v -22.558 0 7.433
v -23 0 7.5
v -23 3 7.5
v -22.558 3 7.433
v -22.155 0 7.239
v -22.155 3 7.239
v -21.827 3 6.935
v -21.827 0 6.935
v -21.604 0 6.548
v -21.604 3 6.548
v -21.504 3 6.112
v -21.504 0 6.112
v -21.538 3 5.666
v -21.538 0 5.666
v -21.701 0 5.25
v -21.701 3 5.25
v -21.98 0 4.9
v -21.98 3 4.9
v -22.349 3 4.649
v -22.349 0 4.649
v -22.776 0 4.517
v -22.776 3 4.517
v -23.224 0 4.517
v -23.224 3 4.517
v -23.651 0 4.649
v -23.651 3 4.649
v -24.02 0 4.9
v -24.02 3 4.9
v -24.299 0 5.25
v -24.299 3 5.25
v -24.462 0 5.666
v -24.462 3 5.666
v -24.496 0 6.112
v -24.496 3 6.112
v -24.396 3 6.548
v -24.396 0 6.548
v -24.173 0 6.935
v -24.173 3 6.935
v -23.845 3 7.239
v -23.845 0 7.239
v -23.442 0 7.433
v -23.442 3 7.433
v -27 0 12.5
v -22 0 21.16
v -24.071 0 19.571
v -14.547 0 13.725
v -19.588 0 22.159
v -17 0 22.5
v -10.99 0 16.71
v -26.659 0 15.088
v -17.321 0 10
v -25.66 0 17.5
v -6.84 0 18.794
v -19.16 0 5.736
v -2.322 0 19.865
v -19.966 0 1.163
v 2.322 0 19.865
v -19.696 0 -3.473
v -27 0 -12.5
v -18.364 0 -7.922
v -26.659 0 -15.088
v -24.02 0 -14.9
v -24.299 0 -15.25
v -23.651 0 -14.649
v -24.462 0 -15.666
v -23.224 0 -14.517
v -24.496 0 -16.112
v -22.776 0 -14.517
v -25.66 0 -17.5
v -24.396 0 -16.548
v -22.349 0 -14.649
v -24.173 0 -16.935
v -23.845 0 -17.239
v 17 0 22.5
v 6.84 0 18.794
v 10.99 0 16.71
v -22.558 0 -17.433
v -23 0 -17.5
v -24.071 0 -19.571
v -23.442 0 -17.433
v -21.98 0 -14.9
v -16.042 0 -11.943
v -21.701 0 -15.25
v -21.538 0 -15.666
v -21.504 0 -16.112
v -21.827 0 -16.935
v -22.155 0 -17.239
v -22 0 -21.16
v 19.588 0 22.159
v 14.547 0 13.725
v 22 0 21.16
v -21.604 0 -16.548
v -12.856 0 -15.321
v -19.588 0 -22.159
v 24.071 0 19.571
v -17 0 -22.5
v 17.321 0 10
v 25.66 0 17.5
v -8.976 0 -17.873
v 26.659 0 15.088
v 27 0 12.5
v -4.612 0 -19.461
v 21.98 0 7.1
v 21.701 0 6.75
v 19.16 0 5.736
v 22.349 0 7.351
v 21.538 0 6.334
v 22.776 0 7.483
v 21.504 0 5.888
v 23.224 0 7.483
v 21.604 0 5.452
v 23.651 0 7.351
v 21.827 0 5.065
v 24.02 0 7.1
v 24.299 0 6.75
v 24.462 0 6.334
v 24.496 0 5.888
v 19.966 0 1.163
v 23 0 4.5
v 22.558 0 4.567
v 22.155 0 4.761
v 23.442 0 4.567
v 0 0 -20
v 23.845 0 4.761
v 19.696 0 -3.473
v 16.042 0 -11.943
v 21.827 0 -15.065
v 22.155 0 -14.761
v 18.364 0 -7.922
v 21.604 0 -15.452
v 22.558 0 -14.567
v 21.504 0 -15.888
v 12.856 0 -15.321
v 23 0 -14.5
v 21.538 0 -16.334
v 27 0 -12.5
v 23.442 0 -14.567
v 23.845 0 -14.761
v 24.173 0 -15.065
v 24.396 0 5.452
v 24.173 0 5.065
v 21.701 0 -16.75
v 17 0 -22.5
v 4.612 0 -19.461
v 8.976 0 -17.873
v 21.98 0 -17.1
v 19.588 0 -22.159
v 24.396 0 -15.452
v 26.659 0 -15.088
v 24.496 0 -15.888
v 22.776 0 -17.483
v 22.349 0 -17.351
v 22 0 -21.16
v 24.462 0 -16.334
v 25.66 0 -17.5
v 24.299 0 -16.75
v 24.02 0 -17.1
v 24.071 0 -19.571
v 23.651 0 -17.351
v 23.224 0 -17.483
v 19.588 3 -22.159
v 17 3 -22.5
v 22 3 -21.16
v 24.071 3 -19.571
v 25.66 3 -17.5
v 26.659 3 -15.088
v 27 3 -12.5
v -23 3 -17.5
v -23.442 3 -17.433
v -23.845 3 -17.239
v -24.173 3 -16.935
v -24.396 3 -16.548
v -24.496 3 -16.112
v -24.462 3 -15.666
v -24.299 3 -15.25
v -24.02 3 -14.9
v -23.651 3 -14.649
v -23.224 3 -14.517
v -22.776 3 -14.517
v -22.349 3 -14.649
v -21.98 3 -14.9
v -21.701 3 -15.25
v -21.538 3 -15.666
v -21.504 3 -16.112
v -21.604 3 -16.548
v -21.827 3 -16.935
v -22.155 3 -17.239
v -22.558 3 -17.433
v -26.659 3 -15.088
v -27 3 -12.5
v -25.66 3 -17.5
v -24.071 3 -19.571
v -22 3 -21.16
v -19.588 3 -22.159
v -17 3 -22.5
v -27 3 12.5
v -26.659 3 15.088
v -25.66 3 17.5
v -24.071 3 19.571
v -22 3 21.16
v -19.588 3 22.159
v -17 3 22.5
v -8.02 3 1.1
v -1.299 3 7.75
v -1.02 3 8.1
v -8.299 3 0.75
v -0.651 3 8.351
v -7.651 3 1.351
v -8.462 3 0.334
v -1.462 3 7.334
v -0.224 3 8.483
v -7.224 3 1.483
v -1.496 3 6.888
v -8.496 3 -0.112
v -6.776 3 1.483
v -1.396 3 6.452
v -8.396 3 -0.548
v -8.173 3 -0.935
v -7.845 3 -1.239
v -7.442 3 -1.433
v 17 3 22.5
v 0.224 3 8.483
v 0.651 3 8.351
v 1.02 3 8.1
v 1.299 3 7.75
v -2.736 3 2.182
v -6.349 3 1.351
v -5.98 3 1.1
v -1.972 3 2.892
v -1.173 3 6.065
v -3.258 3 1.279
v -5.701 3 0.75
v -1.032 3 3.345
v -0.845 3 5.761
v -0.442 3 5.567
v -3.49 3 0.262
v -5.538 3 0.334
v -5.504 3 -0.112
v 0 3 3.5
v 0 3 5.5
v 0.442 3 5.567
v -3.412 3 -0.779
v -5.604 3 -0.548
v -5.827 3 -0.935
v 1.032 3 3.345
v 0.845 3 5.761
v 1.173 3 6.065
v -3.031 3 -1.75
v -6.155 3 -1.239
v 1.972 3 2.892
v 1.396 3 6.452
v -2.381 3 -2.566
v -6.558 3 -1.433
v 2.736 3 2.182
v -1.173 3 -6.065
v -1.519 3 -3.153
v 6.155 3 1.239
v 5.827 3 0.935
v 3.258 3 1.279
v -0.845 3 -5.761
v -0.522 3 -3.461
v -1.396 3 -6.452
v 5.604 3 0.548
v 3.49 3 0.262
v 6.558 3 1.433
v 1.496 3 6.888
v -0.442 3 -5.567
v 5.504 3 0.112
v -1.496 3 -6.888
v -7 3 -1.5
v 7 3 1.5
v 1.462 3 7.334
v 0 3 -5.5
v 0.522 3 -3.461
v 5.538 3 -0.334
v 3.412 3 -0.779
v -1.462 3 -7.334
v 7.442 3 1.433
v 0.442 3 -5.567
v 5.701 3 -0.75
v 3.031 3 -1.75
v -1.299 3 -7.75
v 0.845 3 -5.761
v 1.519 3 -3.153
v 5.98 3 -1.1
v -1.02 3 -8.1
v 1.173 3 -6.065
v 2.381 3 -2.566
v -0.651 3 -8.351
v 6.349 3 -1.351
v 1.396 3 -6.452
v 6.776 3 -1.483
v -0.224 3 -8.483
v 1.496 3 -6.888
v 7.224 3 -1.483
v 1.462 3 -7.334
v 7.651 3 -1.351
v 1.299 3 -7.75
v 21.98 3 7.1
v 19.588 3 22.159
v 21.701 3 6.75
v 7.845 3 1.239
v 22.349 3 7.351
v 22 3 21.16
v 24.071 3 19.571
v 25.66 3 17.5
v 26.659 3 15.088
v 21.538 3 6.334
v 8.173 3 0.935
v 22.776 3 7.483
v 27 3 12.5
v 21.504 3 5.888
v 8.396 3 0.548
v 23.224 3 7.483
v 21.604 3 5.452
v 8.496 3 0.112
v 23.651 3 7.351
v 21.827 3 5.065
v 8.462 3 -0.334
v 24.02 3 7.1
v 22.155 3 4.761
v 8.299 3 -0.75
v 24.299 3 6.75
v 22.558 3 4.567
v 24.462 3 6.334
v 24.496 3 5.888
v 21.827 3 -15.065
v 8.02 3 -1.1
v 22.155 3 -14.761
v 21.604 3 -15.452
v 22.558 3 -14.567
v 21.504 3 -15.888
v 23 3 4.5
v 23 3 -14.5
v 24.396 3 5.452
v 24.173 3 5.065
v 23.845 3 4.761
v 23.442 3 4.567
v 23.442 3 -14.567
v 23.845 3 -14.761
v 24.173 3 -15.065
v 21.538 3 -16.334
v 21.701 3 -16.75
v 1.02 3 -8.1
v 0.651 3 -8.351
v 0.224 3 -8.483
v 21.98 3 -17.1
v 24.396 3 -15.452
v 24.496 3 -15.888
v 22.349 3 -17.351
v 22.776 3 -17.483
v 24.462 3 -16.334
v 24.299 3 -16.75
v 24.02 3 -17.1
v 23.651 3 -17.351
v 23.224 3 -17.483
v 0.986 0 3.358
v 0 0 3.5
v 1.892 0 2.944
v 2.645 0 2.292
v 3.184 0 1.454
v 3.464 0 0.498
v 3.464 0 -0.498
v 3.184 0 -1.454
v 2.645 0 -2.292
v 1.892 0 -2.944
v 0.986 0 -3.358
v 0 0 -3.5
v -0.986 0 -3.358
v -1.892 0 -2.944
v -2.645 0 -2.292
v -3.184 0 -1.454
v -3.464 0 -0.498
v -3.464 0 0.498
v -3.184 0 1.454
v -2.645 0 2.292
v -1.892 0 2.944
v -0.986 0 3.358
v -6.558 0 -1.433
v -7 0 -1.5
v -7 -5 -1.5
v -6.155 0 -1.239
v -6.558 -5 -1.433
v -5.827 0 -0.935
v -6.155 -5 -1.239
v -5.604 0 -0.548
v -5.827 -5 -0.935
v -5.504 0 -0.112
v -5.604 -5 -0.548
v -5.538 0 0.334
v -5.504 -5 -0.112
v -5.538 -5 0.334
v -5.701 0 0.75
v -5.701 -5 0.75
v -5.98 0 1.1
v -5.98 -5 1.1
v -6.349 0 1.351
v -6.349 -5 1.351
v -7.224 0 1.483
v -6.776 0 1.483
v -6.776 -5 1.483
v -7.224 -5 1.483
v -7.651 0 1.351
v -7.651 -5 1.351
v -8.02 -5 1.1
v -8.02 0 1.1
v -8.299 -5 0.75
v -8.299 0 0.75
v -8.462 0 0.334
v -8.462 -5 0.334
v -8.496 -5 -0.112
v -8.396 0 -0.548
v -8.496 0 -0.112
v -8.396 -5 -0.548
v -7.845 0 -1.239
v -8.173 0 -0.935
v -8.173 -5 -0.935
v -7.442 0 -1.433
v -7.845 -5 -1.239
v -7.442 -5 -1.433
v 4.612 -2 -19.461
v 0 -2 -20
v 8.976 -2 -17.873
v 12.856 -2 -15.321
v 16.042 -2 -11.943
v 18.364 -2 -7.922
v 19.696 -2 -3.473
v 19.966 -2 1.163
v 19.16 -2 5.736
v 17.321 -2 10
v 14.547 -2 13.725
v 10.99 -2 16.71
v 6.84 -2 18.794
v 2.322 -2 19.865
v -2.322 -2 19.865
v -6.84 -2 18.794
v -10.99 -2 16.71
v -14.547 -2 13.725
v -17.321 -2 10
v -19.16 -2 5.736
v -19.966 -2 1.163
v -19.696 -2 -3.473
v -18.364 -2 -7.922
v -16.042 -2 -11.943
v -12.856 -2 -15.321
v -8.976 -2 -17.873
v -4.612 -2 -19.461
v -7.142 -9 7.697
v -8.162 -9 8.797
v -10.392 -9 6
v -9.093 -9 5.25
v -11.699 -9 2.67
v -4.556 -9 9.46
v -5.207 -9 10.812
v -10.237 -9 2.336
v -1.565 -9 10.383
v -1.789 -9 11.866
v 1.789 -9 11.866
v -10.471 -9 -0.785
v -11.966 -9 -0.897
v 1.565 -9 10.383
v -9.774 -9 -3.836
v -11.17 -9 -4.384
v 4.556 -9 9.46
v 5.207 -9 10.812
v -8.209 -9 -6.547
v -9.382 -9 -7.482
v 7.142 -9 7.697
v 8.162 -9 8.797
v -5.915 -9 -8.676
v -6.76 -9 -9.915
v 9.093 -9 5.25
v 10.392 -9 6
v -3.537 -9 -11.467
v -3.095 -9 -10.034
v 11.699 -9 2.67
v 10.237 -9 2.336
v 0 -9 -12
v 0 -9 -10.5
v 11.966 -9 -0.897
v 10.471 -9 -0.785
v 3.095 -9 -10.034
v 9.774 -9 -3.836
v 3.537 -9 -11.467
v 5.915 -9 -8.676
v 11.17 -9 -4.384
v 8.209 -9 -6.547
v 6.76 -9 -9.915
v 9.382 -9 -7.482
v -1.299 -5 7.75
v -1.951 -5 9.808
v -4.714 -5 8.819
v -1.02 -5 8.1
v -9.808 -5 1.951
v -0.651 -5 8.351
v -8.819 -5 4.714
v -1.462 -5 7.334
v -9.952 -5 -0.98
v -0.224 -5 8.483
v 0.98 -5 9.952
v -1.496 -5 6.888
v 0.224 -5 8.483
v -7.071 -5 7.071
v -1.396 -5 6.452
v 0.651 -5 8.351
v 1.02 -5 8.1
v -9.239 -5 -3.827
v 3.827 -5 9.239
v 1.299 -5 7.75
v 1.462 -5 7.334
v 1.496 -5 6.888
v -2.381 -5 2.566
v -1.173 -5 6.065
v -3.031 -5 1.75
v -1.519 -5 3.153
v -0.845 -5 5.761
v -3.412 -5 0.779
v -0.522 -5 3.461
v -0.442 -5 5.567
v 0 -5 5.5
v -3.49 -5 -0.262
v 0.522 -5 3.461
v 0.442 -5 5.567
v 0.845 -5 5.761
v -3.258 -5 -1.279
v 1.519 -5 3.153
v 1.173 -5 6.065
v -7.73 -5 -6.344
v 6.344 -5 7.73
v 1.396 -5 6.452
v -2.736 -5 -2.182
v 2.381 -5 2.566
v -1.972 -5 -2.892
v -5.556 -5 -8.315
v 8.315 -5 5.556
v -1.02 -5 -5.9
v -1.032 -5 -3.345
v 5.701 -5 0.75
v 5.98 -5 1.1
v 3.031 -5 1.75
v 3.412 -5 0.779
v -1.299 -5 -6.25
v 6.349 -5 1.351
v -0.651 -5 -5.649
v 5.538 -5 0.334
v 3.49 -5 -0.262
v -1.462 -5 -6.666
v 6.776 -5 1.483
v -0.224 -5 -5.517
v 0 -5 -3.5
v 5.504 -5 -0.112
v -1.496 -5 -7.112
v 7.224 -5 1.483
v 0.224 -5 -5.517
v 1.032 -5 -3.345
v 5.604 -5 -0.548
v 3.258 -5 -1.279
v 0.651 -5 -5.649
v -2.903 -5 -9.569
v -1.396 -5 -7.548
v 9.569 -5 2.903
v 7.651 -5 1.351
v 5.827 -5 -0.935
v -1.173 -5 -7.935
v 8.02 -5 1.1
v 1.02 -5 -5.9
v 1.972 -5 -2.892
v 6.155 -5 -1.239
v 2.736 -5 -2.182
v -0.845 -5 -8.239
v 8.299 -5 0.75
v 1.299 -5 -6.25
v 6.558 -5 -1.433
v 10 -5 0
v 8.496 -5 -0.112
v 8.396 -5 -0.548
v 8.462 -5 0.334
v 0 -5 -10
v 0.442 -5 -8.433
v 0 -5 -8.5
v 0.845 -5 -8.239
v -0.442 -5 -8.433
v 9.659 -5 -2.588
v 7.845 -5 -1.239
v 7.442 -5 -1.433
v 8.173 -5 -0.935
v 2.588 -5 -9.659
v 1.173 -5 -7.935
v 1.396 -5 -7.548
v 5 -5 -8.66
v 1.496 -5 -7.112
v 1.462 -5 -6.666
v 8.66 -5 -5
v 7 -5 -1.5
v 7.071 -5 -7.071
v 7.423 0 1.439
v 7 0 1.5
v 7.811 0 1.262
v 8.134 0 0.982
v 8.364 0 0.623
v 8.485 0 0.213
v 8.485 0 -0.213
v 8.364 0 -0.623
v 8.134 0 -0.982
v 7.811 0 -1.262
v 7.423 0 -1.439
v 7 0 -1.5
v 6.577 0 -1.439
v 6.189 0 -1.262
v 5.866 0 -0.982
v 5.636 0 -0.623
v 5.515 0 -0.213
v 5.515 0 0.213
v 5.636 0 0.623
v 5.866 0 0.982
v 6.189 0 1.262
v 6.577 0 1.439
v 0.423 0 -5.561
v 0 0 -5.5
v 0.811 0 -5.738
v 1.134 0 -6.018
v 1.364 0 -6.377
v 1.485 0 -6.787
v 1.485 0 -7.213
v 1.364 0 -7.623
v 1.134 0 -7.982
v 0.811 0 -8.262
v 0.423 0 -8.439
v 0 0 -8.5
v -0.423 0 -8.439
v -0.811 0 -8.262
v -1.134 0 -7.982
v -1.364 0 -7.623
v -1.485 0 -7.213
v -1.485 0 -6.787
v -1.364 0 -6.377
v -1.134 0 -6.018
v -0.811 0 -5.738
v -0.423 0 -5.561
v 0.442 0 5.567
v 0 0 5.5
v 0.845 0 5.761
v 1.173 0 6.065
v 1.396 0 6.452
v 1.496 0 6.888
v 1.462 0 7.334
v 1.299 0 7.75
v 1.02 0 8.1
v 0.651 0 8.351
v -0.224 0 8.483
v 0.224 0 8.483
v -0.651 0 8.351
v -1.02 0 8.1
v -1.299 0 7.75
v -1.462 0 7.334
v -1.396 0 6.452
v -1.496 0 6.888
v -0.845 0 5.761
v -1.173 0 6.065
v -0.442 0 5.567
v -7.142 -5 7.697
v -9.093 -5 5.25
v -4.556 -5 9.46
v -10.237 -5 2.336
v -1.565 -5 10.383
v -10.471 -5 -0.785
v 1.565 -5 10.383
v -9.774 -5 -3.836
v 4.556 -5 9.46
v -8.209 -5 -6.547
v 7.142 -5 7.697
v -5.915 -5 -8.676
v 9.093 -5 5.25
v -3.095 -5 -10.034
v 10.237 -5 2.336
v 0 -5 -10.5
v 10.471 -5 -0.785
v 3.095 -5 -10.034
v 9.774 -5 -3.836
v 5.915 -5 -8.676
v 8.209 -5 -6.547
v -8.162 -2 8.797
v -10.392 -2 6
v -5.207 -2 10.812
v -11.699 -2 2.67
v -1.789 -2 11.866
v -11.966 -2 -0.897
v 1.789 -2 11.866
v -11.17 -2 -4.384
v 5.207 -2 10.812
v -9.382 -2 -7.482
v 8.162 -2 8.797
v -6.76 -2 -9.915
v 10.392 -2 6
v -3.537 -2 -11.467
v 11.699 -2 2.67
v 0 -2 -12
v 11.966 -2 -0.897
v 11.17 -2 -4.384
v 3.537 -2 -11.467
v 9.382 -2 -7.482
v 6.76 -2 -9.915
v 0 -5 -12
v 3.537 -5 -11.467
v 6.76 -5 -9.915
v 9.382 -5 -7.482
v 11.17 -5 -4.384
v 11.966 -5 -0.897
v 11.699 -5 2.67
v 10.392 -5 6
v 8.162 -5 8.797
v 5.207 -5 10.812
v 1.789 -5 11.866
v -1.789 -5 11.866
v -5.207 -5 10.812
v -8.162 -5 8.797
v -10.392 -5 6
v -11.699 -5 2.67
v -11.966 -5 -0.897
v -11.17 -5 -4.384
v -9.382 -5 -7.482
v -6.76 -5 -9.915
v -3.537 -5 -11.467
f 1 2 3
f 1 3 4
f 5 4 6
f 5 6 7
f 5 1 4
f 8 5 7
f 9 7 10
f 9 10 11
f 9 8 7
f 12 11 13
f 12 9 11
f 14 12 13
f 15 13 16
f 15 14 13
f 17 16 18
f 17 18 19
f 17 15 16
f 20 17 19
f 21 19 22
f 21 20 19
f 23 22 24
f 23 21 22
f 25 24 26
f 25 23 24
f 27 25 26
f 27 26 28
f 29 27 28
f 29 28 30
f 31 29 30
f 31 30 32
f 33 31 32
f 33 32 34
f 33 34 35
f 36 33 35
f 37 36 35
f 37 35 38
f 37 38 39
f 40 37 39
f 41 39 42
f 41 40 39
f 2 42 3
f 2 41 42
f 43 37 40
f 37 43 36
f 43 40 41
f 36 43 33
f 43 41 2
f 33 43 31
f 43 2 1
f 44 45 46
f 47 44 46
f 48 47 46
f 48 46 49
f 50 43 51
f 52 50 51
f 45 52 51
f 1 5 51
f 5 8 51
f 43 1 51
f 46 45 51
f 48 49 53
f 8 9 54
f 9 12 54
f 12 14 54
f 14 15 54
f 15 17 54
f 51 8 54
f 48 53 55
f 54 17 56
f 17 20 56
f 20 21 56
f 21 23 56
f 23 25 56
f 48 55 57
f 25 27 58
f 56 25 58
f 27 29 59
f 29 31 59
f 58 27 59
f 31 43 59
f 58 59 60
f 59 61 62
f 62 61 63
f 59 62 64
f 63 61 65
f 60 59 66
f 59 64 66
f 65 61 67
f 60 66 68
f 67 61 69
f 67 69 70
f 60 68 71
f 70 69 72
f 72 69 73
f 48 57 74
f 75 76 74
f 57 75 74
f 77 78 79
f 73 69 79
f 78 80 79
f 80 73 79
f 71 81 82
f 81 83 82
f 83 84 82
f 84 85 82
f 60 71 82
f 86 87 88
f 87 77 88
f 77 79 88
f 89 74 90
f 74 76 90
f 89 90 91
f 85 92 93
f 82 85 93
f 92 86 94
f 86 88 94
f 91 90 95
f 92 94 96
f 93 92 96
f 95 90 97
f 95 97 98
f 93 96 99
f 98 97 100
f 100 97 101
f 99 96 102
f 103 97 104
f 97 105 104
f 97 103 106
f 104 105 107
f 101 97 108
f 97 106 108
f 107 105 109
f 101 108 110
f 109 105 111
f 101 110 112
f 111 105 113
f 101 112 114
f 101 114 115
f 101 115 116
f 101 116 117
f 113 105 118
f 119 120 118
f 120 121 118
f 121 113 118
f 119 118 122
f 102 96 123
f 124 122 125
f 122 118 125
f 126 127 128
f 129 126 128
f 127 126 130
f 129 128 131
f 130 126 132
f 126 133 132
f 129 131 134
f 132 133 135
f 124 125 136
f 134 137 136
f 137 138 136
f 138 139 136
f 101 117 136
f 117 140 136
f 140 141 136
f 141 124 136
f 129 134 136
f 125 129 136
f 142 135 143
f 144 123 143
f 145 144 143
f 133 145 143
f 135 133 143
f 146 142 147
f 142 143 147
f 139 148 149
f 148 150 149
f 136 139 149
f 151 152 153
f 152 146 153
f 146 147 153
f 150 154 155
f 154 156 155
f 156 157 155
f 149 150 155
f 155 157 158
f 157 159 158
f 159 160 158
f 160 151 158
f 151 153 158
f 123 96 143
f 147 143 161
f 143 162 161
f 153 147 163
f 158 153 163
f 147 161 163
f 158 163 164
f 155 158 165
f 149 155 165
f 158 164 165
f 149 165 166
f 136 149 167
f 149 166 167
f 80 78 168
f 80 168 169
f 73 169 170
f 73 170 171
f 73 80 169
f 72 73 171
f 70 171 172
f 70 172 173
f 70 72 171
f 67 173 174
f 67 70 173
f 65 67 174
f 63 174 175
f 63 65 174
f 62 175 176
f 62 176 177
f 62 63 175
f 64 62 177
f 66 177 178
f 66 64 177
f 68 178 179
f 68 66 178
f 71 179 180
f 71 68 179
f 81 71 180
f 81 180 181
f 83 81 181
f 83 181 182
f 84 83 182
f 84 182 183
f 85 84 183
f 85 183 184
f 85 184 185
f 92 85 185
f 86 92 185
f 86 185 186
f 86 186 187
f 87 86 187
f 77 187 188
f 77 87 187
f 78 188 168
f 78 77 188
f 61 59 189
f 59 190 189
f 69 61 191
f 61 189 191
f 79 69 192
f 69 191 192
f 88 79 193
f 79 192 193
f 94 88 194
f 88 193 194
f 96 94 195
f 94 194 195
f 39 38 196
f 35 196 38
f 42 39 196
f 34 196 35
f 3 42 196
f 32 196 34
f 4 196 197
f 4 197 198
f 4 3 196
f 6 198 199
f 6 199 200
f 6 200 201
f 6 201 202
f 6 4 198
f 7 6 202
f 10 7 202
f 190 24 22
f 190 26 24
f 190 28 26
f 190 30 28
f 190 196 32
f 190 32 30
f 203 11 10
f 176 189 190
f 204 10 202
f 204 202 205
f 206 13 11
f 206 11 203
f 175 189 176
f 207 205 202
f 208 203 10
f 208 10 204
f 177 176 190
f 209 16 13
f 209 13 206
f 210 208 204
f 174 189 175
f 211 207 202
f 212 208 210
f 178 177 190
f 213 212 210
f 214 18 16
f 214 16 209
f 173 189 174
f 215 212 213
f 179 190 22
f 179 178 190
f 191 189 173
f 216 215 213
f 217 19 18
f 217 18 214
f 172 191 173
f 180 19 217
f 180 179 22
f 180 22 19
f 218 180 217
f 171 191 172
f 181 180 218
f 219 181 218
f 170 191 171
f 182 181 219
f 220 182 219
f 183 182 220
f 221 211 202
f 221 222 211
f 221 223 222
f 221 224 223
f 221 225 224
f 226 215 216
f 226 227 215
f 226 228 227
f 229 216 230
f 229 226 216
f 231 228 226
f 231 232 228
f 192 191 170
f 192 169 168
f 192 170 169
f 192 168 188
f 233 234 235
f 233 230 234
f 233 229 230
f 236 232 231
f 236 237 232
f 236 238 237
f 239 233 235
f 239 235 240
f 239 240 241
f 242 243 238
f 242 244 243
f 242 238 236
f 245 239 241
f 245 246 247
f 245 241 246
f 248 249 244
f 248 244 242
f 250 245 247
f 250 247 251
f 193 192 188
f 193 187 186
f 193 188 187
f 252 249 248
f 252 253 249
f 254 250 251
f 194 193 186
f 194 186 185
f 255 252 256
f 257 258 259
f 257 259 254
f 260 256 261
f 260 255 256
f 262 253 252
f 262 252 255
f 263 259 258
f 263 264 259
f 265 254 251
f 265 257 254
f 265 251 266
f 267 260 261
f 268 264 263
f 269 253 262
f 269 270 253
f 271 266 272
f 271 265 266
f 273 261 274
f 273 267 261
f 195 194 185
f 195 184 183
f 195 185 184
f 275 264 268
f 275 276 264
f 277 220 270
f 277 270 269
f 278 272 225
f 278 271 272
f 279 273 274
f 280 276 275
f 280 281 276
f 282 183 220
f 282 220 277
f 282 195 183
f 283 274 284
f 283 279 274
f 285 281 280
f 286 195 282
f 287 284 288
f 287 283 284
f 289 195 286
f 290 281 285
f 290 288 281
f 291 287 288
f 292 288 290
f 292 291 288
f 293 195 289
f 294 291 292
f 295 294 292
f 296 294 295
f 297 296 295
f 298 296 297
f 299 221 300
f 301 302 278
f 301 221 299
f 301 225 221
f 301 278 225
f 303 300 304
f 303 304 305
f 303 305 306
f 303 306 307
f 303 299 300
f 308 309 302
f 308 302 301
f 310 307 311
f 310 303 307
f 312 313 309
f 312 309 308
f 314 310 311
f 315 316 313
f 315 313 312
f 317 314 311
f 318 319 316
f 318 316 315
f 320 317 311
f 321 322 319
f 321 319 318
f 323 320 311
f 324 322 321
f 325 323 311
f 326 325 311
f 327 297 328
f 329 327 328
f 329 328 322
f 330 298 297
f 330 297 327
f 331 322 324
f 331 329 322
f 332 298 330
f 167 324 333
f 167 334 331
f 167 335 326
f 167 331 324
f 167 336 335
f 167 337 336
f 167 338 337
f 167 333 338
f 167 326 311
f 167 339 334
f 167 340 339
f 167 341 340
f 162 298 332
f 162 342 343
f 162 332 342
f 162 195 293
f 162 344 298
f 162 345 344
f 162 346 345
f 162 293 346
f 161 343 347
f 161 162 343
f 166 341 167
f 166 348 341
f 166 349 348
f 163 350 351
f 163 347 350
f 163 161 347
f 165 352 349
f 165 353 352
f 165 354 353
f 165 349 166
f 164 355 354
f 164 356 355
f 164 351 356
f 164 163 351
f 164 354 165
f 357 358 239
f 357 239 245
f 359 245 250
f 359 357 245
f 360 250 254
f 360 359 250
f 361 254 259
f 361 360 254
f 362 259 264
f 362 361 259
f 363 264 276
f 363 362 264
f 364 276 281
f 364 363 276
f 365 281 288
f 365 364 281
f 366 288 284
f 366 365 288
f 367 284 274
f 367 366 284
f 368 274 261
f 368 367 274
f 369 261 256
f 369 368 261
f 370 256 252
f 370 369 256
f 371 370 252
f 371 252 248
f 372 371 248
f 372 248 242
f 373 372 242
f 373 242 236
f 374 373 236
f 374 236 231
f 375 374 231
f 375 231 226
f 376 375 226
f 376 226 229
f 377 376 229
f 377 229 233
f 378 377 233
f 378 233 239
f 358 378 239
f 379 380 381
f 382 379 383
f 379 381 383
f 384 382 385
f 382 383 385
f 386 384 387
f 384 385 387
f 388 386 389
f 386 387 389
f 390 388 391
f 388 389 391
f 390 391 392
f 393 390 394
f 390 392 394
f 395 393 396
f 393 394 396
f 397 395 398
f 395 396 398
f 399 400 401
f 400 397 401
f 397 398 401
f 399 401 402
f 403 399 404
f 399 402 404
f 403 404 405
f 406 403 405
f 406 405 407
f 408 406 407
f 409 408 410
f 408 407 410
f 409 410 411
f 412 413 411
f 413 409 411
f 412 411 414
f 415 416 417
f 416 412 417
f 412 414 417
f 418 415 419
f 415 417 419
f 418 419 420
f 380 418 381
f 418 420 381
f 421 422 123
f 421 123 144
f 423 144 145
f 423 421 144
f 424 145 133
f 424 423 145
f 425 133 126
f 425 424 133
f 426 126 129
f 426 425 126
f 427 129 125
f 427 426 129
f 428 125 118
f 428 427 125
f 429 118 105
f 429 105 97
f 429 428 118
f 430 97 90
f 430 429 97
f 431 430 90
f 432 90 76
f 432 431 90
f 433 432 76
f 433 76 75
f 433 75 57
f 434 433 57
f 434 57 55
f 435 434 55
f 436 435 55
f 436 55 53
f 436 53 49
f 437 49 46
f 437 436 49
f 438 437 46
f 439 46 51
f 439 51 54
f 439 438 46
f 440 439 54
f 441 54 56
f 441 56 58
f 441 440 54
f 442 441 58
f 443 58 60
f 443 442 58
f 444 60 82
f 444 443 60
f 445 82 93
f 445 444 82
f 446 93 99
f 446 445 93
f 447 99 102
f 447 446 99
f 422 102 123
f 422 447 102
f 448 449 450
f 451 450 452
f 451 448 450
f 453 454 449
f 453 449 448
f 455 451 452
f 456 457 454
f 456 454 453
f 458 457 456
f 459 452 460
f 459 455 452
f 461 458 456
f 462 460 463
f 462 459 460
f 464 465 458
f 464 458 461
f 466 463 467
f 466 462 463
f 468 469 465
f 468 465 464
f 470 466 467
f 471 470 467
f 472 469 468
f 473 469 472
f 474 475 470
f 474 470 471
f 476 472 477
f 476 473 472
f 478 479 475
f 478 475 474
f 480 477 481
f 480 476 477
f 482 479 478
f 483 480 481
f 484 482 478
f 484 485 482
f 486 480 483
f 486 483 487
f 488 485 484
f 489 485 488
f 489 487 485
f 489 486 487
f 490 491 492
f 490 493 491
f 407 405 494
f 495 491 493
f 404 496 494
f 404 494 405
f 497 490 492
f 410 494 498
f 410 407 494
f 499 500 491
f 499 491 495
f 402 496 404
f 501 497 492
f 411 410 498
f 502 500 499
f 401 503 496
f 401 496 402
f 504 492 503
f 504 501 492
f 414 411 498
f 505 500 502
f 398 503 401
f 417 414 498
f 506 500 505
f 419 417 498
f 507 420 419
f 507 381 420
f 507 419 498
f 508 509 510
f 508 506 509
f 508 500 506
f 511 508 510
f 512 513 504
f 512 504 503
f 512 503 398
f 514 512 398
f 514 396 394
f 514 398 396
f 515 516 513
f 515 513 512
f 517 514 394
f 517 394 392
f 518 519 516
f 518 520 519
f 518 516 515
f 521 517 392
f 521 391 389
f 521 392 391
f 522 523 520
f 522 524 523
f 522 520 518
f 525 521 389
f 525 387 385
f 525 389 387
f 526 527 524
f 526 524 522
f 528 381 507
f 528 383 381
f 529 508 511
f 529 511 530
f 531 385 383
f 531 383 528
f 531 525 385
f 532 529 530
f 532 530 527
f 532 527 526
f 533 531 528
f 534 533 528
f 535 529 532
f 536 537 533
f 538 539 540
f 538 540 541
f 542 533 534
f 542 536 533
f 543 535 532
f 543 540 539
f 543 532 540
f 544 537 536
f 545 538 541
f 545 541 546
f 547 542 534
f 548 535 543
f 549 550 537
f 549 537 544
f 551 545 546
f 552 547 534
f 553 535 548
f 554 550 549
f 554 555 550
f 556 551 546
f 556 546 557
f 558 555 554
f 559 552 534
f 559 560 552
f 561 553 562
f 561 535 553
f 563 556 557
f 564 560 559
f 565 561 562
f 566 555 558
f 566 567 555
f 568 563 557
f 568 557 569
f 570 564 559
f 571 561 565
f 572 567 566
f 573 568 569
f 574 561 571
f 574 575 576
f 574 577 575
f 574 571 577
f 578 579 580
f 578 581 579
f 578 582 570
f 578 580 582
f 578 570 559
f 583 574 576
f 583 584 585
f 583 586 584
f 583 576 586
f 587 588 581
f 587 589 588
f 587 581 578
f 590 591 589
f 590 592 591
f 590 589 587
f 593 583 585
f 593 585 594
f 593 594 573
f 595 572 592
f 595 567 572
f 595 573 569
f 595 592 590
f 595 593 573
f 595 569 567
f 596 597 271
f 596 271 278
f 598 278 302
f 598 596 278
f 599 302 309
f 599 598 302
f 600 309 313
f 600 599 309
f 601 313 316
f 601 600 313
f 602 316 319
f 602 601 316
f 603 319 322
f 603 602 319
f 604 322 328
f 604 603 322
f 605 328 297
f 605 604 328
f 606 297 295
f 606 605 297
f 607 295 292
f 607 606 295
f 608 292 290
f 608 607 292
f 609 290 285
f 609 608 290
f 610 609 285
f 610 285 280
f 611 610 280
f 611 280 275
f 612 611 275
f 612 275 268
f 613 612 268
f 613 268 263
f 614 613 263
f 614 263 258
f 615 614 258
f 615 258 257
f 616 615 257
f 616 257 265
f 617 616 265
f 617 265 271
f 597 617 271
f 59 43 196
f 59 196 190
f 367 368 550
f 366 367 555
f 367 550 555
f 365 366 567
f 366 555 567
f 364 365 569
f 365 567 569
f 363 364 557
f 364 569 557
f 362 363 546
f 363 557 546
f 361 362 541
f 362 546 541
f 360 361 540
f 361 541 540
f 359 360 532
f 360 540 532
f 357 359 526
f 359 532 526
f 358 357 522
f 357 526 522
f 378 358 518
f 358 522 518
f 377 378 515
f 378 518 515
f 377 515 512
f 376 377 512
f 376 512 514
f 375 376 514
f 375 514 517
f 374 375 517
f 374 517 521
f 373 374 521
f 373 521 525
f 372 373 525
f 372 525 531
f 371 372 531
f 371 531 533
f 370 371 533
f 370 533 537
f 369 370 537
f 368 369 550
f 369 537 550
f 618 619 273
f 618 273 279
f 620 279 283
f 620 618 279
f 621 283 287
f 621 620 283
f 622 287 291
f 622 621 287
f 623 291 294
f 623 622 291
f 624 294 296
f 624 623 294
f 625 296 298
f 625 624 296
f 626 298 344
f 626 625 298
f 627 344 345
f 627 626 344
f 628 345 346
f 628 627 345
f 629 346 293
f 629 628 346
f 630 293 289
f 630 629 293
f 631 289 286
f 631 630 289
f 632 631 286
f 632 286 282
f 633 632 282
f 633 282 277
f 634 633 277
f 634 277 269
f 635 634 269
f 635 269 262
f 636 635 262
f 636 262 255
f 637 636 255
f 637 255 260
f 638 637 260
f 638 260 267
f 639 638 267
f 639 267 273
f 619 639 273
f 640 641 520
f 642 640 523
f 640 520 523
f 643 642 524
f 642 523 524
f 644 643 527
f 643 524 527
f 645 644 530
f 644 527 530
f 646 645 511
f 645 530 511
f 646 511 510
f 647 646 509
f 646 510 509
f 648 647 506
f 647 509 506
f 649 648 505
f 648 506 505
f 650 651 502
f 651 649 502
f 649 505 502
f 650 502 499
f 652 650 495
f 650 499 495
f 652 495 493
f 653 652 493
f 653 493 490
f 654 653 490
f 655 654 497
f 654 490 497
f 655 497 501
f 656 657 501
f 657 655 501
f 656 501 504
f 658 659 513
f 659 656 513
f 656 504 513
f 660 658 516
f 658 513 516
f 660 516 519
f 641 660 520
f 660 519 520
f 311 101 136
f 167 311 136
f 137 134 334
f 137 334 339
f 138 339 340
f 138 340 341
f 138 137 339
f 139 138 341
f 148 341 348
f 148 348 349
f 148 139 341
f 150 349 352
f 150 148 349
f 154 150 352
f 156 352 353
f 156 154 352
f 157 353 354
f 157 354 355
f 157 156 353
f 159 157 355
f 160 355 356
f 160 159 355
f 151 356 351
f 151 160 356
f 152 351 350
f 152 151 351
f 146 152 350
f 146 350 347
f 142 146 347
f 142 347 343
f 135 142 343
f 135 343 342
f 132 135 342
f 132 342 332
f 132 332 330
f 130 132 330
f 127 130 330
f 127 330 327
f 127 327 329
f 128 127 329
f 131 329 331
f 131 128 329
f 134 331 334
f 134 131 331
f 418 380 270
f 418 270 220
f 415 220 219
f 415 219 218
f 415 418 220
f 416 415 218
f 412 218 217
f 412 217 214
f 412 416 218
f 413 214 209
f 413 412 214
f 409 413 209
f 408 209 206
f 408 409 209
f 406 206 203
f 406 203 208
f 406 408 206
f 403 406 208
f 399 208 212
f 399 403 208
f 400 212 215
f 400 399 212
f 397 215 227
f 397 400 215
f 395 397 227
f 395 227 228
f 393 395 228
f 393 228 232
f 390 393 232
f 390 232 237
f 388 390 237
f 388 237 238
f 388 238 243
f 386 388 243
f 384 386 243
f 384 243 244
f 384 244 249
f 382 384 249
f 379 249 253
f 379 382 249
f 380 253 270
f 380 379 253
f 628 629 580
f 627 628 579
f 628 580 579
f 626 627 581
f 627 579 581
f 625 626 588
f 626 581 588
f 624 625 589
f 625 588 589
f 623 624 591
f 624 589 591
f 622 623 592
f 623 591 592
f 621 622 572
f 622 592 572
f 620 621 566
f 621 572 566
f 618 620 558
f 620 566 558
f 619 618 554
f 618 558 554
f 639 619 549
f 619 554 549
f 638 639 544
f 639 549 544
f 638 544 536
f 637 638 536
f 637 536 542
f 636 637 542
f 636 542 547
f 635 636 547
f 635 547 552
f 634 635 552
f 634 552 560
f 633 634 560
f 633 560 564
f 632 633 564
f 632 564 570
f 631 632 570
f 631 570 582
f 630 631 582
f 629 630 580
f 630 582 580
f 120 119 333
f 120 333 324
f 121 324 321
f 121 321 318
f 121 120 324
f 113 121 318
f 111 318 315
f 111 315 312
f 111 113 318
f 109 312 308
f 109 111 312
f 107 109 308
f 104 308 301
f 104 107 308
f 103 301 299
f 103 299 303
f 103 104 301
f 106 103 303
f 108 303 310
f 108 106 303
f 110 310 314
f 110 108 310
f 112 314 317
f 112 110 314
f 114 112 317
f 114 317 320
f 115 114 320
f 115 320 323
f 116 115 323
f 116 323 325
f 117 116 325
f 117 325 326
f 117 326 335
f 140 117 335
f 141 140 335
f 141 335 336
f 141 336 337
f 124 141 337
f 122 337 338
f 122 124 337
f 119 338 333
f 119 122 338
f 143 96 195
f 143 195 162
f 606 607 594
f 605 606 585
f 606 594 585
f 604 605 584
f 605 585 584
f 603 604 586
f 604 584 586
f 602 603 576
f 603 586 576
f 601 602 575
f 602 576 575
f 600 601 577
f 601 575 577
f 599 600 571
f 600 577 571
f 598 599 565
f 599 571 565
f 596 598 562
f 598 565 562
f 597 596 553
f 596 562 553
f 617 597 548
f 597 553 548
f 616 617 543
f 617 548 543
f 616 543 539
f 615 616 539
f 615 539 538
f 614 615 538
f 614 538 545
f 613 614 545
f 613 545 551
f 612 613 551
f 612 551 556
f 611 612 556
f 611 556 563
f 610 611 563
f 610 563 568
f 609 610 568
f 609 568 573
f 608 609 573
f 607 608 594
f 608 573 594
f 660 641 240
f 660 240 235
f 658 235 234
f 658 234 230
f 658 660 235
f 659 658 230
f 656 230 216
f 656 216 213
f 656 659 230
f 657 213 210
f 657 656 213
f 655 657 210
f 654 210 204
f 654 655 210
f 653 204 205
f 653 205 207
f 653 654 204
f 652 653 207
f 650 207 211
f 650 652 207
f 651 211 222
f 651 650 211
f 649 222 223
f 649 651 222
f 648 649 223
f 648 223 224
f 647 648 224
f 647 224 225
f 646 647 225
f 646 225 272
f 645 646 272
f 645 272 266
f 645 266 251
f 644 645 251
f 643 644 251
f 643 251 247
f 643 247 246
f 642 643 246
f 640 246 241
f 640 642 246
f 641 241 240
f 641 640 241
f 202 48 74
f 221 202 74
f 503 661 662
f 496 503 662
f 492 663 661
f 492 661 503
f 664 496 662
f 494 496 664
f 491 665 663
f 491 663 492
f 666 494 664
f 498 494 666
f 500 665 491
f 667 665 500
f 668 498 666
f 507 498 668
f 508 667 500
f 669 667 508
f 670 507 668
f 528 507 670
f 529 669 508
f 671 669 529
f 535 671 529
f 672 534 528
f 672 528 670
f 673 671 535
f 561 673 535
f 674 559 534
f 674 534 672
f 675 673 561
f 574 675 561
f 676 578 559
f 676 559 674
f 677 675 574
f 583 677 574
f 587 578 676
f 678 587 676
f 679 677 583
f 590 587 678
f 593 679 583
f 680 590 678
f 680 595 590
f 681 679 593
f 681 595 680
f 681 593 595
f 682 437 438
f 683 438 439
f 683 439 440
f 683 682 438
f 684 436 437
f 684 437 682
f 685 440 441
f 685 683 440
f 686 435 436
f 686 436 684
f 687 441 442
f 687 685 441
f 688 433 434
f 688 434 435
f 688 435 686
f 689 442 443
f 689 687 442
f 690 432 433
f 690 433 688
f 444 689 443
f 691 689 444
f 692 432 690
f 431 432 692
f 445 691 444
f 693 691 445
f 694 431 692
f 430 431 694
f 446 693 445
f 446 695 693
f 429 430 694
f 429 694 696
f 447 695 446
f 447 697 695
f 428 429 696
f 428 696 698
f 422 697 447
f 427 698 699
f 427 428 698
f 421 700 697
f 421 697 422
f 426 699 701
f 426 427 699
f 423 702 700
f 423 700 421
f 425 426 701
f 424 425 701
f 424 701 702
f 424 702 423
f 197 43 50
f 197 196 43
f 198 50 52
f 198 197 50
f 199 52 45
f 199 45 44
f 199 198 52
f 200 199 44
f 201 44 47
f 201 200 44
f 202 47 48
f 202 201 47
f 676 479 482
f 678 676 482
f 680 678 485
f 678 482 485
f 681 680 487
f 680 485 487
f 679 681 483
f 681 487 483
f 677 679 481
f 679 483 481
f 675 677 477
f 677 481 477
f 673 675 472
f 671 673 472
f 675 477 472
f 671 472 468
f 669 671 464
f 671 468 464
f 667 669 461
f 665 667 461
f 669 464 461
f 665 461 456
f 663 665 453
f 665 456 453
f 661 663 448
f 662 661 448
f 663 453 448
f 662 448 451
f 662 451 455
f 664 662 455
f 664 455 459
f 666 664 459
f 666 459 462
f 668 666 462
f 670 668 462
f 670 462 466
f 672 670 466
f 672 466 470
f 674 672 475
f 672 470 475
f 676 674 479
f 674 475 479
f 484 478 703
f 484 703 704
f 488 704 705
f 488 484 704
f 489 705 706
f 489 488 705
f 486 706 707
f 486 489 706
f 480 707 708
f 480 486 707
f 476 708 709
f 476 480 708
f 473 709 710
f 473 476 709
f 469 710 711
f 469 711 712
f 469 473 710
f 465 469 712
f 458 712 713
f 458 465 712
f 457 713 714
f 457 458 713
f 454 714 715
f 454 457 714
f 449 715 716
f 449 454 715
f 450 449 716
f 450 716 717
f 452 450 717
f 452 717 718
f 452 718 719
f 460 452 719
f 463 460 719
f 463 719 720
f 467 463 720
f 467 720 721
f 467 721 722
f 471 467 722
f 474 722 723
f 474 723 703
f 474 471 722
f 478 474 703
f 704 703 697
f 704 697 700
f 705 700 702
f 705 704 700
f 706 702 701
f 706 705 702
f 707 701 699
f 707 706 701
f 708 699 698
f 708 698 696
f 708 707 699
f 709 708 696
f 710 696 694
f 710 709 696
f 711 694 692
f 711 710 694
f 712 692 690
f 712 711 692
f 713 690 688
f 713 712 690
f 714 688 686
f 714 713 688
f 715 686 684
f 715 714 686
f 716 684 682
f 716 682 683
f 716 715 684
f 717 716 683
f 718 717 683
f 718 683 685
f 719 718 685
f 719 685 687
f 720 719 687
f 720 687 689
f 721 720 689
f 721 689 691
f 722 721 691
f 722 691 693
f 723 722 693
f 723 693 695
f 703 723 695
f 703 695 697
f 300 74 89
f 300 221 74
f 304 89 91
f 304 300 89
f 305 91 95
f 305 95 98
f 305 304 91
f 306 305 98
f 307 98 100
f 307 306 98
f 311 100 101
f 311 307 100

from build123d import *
from build123d.topology import SkipClean

# Parameters (mm, degrees)
SKETCH_1_W      = 54
SKETCH_1_H      = 45
SKETCH_1_R      = 1.5
SKETCH_1_R_2    = 3.5
EXTRUDE_1_DEPTH = 3
EXTRUDE_START   = 5
SKETCH_2_R      = 10
SKETCH_2_R_2    = 1.5
SKETCH_2_R_3    = 3.5
EXTRUDE_2_DEPTH = 5
FILLET_1_R      = 10
SKETCH_6_R      = 12
SKETCH_6_R_2    = 10
EXTRUDE_3_DEPTH = 5
EXTRUDE_START_2 = 4
SKETCH_7_R      = 12
SKETCH_7_R_2    = 10.5
EXTRUDE_4_DEPTH = 4
EXTRUDE_START_3 = 2
SKETCH_8_R      = 20
SKETCH_8_R_2    = 12
EXTRUDE_5_DEPTH = 2


with BuildPart() as part:
    # 草图1 → 凸台-拉伸1 (new body)
    with BuildSketch(Plane(origin=(0, 0, 0), x_dir=(1, 0, 0), z_dir=(0, 1, 0))):
        Rectangle(SKETCH_1_W, SKETCH_1_H)
        with Locations(Location((0, 7, 0), (0, 0, 270))):
            Circle(SKETCH_1_R, mode=Mode.SUBTRACT)
        with Locations(Location((7, 0, 0), (0, 0, 270))):
            Circle(SKETCH_1_R, mode=Mode.SUBTRACT)
        with Locations(Location((0, 0, 0), (0, 0, 270))):
            Circle(SKETCH_1_R_2, mode=Mode.SUBTRACT)
        with Locations(Location((0, -7, 0), (0, 0, 90))):
            Circle(SKETCH_1_R, mode=Mode.SUBTRACT)
        with Locations(Location((-7, 0, 0), (0, 0, 90))):
            Circle(SKETCH_1_R, mode=Mode.SUBTRACT)
        with Locations(Location((23, 16, 0), (0, 0, 270))):
            Circle(SKETCH_1_R, mode=Mode.SUBTRACT)
        with Locations(Location((23, -6, 0), (0, 0, 90))):
            Circle(SKETCH_1_R, mode=Mode.SUBTRACT)
        with Locations(Location((-23, -6, 0), (0, 0, 270))):
            Circle(SKETCH_1_R, mode=Mode.SUBTRACT)
        with Locations(Location((-23, 16, 0), (0, 0, 90))):
            Circle(SKETCH_1_R, mode=Mode.SUBTRACT)
    extrude(amount=EXTRUDE_1_DEPTH)

    # 草图2 → 凸台-拉伸2 (add)
    with SkipClean():  # the faces are left unmerged after this step: merging them gives an invalid solid
        with BuildSketch(Plane.XZ.offset(EXTRUDE_START)):
            with Locations(Location((0, 0, 0), (0, 0, 270))):
                Circle(SKETCH_2_R)
            with Locations(Location((0, 7, 0), (0, 0, 270))):
                Circle(SKETCH_2_R_2, mode=Mode.SUBTRACT)
            with Locations(Location((0, 0, 0), (0, 0, 270))):
                Circle(SKETCH_2_R_3, mode=Mode.SUBTRACT)
            with Locations(Location((-7, 0, 0), (0, 0, 270))):
                Circle(SKETCH_2_R_2, mode=Mode.SUBTRACT)
            with Locations(Location((0, -7, 0), (0, 0, 270))):
                Circle(SKETCH_2_R_2, mode=Mode.SUBTRACT)
            with Locations(Location((7, 0, 0), (0, 0, 270))):
                Circle(SKETCH_2_R_2, mode=Mode.SUBTRACT)
        extrude(amount=-EXTRUDE_2_DEPTH)

    # 圆角1
    fillet_1_edges = [part.edges().sort_by_distance(p)[0] for p in [
        (27, 1.5, 22.5),
        (-27, 1.5, 22.5),
        (-27, 1.5, -22.5),
        (27, 1.5, -22.5),
    ]]
    fillet(fillet_1_edges, radius=FILLET_1_R)

    # 草图6 → 凸台-拉伸3 (add)
    with SkipClean():  # the faces are left unmerged after this step: merging them gives an invalid solid
        with BuildSketch(Plane.XZ.offset(EXTRUDE_START)):
            with Locations(Location((0, 0, 0), (0, 0, 270))):
                Circle(SKETCH_6_R)
            Circle(SKETCH_6_R_2, mode=Mode.SUBTRACT)
        extrude(amount=-EXTRUDE_3_DEPTH)

    # 草图7 → 凸台-拉伸4 (add)
    with SkipClean():  # the faces are left unmerged after this step: merging them gives an invalid solid
        with BuildSketch(Plane.XZ.offset(5).offset(EXTRUDE_START_2)):
            with Locations(Location((0, 0, 0), (0, 0, 270))):
                Circle(SKETCH_7_R)
            with Locations(Location((0, 0, 0), (0, 0, 270))):
                Circle(SKETCH_7_R_2, mode=Mode.SUBTRACT)
        extrude(amount=-EXTRUDE_4_DEPTH)

    # 草图8 → 凸台-拉伸5 (add)
    with SkipClean():  # the faces are left unmerged after this step: merging them gives an invalid solid
        with BuildSketch(Plane.XZ.offset(EXTRUDE_START_3)):
            with Locations(Location((0, 0, 0), (0, 0, 270))):
                Circle(SKETCH_8_R)
            with Locations(Location((0, 0, 0), (0, 0, 270))):
                Circle(SKETCH_8_R_2, mode=Mode.SUBTRACT)
        extrude(amount=-EXTRUDE_5_DEPTH)


solid = part.part
